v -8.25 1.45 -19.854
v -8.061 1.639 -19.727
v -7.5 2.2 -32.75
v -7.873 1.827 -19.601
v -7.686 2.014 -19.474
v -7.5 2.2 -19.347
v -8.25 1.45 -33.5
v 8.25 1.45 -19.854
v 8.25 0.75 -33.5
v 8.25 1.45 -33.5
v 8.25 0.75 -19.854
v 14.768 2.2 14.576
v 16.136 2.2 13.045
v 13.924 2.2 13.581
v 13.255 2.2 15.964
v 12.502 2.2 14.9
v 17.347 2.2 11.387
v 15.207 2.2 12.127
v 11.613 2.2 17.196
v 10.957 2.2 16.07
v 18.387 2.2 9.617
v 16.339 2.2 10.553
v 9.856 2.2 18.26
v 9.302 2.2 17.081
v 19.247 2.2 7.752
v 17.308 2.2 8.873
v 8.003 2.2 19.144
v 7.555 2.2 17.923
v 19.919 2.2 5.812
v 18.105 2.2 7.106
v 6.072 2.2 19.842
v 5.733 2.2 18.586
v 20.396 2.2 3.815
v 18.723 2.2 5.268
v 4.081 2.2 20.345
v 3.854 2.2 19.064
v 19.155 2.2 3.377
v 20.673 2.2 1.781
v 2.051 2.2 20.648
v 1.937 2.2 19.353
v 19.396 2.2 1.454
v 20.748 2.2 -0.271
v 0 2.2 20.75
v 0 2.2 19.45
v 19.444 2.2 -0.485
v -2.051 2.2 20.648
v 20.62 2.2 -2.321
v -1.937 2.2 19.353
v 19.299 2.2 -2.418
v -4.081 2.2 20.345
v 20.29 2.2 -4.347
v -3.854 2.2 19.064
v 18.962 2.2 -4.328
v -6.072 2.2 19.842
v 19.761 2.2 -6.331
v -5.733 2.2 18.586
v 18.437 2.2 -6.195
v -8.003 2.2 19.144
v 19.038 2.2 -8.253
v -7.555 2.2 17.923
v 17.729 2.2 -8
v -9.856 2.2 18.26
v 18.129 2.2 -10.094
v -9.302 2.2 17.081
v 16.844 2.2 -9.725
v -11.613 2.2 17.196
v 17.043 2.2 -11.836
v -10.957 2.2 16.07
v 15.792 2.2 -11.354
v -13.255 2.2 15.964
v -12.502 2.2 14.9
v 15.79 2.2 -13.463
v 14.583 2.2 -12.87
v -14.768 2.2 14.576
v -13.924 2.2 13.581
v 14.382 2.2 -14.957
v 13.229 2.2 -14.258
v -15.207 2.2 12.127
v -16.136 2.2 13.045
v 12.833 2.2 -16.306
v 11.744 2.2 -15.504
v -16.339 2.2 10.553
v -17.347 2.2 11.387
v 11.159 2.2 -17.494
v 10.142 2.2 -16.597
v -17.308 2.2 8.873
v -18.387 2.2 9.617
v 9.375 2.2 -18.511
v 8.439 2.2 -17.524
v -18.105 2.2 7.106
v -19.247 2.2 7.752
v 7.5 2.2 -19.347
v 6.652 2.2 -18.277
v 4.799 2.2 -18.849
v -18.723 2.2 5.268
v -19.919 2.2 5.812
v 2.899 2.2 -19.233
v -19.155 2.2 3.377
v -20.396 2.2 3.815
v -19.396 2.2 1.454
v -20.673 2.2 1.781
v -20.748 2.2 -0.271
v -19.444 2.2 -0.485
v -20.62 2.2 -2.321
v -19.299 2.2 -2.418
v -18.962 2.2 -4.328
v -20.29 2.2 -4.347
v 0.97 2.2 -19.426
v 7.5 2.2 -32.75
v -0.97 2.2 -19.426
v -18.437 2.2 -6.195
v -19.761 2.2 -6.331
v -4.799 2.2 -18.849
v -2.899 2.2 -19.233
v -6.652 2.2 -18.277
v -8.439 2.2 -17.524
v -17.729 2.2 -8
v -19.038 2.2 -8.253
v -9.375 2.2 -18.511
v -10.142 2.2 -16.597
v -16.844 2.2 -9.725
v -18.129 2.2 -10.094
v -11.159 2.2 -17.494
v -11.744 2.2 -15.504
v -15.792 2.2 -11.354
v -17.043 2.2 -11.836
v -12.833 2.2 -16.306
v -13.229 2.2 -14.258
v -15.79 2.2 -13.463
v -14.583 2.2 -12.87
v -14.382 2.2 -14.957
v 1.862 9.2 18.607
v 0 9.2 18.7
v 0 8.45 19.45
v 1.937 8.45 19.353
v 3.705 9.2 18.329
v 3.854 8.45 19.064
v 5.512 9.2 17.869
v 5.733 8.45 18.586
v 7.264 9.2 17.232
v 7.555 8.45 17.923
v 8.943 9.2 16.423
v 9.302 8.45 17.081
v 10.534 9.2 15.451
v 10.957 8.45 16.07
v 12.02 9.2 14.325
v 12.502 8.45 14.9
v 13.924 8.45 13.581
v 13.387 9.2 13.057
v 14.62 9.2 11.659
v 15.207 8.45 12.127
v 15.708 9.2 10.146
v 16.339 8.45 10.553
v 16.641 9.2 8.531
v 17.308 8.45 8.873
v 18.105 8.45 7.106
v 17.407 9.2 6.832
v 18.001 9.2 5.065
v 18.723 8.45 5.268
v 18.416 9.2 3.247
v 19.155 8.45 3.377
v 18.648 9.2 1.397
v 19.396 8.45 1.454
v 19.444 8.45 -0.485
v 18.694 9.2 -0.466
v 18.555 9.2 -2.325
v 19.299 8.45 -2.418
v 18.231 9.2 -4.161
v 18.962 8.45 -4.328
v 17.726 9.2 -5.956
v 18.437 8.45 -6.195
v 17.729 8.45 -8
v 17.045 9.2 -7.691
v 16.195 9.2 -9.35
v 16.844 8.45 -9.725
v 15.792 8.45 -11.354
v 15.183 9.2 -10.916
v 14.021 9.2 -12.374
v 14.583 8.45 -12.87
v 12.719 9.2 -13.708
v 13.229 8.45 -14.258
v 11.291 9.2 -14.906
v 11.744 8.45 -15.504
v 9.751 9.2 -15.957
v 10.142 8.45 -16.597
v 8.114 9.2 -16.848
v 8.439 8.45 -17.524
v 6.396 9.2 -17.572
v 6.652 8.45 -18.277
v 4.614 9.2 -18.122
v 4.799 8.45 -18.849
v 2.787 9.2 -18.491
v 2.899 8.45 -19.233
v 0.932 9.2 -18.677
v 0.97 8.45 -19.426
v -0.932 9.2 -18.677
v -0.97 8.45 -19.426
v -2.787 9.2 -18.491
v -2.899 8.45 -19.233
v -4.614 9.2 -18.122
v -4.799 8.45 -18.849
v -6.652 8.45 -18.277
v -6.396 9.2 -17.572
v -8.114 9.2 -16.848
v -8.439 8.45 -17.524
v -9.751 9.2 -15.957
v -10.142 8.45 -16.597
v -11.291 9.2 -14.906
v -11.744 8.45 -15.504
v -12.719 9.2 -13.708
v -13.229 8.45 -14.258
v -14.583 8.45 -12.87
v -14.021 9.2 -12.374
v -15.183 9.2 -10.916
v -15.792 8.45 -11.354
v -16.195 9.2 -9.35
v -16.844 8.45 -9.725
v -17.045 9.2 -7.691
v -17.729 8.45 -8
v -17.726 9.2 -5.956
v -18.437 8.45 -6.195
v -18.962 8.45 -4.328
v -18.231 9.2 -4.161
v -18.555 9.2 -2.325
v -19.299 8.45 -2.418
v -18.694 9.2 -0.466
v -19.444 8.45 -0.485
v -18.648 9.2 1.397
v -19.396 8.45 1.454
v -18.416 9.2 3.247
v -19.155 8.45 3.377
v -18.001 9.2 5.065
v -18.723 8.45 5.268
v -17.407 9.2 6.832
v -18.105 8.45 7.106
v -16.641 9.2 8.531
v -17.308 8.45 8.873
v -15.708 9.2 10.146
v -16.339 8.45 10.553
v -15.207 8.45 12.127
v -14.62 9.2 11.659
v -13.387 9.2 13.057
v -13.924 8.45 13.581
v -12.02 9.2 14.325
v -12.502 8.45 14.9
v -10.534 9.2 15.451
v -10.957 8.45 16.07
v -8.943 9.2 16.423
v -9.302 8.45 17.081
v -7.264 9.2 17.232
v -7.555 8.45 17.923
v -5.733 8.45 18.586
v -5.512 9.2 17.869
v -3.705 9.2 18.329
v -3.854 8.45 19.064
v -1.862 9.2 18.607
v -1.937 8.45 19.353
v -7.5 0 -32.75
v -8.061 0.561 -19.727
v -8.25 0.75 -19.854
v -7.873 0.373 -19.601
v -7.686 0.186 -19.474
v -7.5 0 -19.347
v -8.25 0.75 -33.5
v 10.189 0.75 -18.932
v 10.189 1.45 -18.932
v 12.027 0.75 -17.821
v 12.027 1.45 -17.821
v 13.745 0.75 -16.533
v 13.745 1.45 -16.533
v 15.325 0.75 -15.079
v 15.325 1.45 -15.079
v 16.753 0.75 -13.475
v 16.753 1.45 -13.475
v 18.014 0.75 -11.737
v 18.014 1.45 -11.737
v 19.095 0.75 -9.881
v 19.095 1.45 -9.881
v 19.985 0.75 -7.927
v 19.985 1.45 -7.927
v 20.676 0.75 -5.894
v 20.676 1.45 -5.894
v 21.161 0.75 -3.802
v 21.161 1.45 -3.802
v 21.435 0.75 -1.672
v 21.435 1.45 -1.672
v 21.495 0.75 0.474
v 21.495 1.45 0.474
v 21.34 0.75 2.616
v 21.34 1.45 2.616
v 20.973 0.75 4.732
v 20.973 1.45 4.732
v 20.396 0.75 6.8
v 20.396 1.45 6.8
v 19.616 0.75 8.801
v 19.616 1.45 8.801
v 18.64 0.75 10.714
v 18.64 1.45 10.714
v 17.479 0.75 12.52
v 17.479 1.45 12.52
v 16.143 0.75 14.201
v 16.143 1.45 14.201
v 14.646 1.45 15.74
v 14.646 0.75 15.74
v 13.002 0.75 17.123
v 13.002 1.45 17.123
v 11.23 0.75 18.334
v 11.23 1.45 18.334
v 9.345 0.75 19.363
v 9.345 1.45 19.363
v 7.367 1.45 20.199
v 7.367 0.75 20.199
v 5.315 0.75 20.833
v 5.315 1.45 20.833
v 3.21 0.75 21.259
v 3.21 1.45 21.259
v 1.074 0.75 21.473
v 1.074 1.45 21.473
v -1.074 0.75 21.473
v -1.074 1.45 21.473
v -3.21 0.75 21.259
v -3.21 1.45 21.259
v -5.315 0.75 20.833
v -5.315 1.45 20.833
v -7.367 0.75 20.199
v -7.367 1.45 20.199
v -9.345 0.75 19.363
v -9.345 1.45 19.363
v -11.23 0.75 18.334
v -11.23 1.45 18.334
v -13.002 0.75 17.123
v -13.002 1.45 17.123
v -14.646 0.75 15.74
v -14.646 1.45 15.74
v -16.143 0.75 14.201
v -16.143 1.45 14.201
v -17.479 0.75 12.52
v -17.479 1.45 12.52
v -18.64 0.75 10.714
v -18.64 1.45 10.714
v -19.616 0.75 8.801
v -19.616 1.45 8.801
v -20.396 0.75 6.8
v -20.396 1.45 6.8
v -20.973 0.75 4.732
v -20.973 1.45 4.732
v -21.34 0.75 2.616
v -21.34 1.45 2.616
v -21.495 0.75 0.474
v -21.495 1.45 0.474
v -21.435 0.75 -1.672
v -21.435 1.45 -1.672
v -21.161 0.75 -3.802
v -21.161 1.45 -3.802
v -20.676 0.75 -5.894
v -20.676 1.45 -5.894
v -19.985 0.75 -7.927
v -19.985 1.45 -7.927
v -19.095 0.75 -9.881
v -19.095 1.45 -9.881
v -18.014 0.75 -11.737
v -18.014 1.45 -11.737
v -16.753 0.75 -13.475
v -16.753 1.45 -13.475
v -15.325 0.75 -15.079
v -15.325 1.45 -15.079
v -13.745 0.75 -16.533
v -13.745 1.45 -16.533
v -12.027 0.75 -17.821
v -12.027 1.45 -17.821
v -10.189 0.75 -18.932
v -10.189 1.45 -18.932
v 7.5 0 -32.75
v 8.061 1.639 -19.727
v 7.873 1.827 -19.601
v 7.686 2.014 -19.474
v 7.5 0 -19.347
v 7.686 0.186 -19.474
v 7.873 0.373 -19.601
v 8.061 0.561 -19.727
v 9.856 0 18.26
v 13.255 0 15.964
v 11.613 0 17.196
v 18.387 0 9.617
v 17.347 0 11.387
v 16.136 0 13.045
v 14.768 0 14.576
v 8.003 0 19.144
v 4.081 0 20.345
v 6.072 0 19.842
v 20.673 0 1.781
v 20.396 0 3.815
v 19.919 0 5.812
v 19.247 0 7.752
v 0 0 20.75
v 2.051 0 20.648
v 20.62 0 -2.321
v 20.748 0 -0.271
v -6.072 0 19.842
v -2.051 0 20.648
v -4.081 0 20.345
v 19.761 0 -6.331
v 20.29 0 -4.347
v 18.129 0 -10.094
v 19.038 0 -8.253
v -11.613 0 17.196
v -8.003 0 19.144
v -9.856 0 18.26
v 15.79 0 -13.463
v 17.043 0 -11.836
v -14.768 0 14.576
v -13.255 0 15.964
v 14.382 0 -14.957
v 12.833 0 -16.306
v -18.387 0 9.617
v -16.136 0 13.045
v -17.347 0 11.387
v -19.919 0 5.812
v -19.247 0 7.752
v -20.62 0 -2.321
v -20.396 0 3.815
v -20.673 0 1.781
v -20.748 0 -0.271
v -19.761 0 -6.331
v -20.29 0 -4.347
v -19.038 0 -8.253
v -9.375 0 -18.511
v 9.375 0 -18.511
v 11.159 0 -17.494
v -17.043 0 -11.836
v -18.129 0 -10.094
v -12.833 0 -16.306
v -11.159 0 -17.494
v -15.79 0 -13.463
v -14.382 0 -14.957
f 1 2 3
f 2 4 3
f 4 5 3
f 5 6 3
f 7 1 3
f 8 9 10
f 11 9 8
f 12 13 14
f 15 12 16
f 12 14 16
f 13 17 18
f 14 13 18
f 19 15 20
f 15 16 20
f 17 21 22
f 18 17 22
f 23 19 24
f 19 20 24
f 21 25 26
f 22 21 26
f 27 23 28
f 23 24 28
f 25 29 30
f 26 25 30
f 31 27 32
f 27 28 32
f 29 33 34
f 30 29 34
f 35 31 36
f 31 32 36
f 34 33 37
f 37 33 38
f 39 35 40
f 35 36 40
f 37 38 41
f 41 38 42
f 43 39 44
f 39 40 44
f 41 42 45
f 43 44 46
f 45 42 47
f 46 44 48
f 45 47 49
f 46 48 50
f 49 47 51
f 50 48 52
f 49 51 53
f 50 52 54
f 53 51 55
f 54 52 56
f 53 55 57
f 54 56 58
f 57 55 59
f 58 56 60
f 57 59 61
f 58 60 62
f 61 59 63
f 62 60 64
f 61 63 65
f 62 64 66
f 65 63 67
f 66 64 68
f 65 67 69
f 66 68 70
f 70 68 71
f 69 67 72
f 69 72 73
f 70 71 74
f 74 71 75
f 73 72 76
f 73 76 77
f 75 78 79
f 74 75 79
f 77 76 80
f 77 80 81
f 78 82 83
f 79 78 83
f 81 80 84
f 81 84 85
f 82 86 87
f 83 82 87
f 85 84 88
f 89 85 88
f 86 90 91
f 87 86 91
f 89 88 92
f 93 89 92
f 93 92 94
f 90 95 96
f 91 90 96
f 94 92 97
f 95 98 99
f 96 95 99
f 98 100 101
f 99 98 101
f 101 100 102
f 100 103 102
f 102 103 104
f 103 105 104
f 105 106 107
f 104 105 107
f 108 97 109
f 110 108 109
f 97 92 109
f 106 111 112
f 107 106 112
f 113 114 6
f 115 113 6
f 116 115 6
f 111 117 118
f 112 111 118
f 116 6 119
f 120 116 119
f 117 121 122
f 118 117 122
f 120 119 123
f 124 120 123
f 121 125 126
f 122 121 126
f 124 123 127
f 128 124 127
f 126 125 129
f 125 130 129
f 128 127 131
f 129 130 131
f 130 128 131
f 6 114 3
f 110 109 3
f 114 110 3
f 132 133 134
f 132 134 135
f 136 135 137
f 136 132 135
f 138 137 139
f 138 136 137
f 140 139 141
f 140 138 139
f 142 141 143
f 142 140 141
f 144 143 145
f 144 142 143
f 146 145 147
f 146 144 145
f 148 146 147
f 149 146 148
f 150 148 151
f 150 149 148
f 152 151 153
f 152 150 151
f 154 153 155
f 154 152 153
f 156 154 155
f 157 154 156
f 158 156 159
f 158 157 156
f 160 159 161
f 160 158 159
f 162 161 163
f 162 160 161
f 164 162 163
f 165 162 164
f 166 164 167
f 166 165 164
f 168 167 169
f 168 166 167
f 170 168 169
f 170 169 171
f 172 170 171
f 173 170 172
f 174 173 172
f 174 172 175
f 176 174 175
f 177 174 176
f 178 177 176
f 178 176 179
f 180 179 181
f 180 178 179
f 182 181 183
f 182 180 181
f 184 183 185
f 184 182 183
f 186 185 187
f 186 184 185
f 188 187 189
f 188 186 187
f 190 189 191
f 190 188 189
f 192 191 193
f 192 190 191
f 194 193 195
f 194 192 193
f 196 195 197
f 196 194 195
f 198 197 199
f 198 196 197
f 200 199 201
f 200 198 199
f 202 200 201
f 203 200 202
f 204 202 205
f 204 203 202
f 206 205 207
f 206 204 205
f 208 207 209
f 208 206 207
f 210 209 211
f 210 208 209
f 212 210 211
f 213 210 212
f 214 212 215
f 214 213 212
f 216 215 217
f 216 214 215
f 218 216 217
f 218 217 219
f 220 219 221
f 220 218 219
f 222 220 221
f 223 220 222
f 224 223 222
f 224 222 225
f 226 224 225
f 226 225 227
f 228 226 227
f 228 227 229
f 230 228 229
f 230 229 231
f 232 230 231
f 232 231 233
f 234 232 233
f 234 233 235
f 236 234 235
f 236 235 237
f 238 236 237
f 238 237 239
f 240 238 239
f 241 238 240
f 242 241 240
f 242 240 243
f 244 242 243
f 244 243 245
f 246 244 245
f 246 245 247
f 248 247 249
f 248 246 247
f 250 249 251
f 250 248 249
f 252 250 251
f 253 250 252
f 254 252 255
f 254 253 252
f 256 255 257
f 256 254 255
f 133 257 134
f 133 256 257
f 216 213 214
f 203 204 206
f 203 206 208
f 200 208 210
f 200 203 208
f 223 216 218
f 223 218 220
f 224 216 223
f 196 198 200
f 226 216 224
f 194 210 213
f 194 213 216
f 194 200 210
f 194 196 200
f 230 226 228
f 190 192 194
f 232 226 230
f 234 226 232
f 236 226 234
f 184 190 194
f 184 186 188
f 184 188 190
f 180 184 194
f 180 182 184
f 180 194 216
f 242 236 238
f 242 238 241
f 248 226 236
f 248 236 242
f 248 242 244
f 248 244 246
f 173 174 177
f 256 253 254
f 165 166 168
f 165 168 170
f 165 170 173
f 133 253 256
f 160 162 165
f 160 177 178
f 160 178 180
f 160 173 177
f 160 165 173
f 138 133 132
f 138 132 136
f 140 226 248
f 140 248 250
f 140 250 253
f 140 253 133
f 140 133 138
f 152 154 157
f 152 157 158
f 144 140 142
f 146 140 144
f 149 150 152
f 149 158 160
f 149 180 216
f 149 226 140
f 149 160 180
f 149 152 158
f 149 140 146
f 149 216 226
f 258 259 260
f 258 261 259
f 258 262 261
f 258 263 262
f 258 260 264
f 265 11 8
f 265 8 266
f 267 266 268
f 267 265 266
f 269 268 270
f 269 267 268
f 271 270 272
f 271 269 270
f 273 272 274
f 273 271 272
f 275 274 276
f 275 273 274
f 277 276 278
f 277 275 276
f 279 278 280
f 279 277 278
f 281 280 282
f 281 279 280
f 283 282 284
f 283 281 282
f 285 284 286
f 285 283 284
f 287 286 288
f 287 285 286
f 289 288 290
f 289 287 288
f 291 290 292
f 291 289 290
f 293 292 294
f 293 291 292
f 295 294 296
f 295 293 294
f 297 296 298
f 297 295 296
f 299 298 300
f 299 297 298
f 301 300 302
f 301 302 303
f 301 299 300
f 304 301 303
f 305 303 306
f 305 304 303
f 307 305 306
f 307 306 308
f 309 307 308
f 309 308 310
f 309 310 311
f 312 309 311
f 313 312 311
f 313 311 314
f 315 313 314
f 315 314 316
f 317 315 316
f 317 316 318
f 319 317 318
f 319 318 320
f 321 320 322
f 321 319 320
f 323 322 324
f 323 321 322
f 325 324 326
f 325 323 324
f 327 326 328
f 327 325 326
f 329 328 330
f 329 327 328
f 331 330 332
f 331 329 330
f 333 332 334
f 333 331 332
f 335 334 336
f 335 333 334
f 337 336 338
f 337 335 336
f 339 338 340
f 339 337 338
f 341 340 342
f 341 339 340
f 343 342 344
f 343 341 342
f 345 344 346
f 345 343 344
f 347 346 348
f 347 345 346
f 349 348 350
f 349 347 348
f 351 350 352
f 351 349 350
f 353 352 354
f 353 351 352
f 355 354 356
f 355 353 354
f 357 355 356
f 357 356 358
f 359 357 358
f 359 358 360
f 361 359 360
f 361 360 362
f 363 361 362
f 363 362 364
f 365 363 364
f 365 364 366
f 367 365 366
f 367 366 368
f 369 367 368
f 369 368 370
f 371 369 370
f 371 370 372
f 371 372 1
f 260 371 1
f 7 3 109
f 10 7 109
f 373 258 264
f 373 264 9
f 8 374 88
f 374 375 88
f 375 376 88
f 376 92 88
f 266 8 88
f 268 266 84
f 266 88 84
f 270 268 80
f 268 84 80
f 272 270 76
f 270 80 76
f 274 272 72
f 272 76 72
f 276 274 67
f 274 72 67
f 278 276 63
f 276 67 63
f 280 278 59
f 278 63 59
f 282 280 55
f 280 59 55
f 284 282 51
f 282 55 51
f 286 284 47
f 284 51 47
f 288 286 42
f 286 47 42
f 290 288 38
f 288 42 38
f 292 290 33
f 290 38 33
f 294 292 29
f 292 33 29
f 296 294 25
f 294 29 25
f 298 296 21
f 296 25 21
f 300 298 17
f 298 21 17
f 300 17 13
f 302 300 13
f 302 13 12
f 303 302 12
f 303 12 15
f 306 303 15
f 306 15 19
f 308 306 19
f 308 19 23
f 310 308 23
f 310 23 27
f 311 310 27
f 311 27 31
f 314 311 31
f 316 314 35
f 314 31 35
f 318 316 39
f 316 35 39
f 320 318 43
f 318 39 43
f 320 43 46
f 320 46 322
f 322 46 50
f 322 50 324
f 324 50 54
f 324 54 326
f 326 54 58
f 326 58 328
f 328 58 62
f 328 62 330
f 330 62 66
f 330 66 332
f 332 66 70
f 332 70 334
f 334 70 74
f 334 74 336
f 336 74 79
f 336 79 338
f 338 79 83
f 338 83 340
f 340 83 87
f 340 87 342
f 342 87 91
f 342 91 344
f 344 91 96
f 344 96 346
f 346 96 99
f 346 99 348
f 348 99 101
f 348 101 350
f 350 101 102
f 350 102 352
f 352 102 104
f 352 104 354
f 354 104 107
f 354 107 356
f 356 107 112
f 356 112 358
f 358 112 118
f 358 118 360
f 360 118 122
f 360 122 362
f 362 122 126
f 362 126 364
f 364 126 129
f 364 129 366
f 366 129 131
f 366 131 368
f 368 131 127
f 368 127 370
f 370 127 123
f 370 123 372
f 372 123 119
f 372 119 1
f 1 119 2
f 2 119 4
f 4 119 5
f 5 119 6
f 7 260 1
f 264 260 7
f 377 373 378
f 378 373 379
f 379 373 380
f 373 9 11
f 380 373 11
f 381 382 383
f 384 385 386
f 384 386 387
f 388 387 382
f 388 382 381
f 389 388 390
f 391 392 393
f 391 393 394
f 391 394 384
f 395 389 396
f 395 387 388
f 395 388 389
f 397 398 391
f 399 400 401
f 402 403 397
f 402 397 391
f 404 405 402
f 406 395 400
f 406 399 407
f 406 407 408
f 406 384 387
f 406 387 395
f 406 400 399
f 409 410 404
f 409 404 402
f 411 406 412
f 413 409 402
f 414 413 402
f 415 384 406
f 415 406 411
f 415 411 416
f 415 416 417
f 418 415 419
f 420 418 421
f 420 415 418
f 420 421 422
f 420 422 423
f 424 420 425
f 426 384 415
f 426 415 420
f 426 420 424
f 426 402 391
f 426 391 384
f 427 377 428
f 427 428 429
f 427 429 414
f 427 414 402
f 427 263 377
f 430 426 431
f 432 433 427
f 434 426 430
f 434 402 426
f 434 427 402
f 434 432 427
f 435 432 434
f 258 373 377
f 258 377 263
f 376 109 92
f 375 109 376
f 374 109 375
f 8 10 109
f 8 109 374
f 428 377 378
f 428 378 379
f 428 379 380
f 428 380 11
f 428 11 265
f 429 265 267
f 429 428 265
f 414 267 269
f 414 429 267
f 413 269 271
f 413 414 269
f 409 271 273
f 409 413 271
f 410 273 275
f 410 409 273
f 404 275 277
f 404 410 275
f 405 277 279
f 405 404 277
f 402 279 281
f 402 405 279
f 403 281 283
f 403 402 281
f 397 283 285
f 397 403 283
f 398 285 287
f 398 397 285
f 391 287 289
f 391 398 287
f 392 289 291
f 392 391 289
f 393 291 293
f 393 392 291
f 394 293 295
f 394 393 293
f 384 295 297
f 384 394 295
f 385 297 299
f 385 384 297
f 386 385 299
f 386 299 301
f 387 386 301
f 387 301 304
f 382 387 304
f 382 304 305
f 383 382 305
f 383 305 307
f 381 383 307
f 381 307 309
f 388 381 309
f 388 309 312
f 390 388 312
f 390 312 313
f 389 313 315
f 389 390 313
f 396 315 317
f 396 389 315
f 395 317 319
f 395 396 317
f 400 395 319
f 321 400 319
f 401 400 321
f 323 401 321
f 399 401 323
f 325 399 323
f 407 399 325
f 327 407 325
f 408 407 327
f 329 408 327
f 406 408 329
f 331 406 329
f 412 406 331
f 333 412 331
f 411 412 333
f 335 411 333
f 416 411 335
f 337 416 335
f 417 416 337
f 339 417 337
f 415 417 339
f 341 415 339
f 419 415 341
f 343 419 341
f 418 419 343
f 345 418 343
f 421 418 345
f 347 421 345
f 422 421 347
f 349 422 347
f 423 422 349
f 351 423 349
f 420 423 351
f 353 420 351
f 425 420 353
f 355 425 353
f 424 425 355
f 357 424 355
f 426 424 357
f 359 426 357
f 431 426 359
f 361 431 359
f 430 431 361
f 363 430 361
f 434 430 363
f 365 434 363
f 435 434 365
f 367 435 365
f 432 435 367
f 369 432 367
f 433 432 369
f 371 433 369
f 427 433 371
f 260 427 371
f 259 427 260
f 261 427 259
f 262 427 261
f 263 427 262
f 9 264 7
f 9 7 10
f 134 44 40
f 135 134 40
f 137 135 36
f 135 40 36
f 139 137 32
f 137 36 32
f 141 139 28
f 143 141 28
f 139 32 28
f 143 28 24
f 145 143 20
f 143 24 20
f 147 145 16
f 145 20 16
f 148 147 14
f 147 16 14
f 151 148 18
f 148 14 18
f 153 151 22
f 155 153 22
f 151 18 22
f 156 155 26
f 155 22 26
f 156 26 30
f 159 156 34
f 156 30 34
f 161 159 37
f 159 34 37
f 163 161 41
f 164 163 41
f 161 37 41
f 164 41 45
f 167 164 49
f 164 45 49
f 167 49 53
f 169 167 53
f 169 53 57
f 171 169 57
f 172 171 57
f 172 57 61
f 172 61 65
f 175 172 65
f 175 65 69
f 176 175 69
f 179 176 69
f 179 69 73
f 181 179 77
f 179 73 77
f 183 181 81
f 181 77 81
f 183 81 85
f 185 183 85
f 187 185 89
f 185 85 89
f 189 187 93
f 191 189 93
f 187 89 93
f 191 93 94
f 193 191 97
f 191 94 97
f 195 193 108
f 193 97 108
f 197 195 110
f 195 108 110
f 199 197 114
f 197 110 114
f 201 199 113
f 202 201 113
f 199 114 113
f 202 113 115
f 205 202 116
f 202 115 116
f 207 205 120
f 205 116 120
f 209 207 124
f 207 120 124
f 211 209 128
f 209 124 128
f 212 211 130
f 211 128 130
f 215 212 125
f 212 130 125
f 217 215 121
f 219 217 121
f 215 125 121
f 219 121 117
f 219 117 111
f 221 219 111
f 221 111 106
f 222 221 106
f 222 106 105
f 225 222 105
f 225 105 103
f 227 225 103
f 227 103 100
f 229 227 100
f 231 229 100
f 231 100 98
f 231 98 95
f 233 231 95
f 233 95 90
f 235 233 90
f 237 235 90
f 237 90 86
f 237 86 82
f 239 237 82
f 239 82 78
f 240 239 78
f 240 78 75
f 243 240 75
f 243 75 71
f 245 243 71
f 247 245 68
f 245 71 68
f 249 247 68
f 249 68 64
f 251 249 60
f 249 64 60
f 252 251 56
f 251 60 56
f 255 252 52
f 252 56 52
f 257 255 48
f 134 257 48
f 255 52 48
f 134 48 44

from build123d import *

# Parameters (mm, degrees)
BOSS_EXTRUDE1_DEPTH = 2.2
SKETCH2_R           = 19.45
BOSS_EXTRUDE2_DEPTH = 7
CHAMFER1_SIZE       = 0.75


with BuildPart() as part:
    # Sketch1 → Boss-Extrude1 (new body)
    with BuildSketch(Plane(origin=(0, 0, 0), x_dir=(1, 0, 0), z_dir=(0, 1, 0))):
        with BuildLine():
            Line((-8.25, 19.854155736), (-8.25, 33.5))
            Line((-8.25, 33.5), (8.25, 33.5))
            Line((8.25, 33.5), (8.25, 19.854155736))
            ThreePointArc((8.25, 19.854155736), (0, -21.5), (-8.25, 19.854155736))
        make_face()
    extrude(amount=BOSS_EXTRUDE1_DEPTH)

    # Sketch2 → Boss-Extrude2 (add)
    with BuildSketch(Plane(origin=(0, 2.2, 0), x_dir=(1, 0, 0), z_dir=(0, 1, 0))):
        with Locations(Location((0, 0, 0), (0, 0, 270))):
            Circle(SKETCH2_R)
    extrude(amount=BOSS_EXTRUDE2_DEPTH)

    # Chamfer1
    chamfer1_edges = [part.edges().sort_by_distance(p)[0] for p in [
        (0, 2.2, -33.5),
        (0, 9.2, -19.45),
        (-8.25, 2.2, -26.677077868),
        (0, 2.2, 21.5),
        (-8.25, 0, -26.677077868),
        (0, 0, -33.5),
        (8.25, 0, -26.677077868),
        (0, 0, 21.5),
        (8.25, 2.2, -26.677077868),
    ]]
    chamfer(chamfer1_edges, length=CHAMFER1_SIZE)


solid = part.part
